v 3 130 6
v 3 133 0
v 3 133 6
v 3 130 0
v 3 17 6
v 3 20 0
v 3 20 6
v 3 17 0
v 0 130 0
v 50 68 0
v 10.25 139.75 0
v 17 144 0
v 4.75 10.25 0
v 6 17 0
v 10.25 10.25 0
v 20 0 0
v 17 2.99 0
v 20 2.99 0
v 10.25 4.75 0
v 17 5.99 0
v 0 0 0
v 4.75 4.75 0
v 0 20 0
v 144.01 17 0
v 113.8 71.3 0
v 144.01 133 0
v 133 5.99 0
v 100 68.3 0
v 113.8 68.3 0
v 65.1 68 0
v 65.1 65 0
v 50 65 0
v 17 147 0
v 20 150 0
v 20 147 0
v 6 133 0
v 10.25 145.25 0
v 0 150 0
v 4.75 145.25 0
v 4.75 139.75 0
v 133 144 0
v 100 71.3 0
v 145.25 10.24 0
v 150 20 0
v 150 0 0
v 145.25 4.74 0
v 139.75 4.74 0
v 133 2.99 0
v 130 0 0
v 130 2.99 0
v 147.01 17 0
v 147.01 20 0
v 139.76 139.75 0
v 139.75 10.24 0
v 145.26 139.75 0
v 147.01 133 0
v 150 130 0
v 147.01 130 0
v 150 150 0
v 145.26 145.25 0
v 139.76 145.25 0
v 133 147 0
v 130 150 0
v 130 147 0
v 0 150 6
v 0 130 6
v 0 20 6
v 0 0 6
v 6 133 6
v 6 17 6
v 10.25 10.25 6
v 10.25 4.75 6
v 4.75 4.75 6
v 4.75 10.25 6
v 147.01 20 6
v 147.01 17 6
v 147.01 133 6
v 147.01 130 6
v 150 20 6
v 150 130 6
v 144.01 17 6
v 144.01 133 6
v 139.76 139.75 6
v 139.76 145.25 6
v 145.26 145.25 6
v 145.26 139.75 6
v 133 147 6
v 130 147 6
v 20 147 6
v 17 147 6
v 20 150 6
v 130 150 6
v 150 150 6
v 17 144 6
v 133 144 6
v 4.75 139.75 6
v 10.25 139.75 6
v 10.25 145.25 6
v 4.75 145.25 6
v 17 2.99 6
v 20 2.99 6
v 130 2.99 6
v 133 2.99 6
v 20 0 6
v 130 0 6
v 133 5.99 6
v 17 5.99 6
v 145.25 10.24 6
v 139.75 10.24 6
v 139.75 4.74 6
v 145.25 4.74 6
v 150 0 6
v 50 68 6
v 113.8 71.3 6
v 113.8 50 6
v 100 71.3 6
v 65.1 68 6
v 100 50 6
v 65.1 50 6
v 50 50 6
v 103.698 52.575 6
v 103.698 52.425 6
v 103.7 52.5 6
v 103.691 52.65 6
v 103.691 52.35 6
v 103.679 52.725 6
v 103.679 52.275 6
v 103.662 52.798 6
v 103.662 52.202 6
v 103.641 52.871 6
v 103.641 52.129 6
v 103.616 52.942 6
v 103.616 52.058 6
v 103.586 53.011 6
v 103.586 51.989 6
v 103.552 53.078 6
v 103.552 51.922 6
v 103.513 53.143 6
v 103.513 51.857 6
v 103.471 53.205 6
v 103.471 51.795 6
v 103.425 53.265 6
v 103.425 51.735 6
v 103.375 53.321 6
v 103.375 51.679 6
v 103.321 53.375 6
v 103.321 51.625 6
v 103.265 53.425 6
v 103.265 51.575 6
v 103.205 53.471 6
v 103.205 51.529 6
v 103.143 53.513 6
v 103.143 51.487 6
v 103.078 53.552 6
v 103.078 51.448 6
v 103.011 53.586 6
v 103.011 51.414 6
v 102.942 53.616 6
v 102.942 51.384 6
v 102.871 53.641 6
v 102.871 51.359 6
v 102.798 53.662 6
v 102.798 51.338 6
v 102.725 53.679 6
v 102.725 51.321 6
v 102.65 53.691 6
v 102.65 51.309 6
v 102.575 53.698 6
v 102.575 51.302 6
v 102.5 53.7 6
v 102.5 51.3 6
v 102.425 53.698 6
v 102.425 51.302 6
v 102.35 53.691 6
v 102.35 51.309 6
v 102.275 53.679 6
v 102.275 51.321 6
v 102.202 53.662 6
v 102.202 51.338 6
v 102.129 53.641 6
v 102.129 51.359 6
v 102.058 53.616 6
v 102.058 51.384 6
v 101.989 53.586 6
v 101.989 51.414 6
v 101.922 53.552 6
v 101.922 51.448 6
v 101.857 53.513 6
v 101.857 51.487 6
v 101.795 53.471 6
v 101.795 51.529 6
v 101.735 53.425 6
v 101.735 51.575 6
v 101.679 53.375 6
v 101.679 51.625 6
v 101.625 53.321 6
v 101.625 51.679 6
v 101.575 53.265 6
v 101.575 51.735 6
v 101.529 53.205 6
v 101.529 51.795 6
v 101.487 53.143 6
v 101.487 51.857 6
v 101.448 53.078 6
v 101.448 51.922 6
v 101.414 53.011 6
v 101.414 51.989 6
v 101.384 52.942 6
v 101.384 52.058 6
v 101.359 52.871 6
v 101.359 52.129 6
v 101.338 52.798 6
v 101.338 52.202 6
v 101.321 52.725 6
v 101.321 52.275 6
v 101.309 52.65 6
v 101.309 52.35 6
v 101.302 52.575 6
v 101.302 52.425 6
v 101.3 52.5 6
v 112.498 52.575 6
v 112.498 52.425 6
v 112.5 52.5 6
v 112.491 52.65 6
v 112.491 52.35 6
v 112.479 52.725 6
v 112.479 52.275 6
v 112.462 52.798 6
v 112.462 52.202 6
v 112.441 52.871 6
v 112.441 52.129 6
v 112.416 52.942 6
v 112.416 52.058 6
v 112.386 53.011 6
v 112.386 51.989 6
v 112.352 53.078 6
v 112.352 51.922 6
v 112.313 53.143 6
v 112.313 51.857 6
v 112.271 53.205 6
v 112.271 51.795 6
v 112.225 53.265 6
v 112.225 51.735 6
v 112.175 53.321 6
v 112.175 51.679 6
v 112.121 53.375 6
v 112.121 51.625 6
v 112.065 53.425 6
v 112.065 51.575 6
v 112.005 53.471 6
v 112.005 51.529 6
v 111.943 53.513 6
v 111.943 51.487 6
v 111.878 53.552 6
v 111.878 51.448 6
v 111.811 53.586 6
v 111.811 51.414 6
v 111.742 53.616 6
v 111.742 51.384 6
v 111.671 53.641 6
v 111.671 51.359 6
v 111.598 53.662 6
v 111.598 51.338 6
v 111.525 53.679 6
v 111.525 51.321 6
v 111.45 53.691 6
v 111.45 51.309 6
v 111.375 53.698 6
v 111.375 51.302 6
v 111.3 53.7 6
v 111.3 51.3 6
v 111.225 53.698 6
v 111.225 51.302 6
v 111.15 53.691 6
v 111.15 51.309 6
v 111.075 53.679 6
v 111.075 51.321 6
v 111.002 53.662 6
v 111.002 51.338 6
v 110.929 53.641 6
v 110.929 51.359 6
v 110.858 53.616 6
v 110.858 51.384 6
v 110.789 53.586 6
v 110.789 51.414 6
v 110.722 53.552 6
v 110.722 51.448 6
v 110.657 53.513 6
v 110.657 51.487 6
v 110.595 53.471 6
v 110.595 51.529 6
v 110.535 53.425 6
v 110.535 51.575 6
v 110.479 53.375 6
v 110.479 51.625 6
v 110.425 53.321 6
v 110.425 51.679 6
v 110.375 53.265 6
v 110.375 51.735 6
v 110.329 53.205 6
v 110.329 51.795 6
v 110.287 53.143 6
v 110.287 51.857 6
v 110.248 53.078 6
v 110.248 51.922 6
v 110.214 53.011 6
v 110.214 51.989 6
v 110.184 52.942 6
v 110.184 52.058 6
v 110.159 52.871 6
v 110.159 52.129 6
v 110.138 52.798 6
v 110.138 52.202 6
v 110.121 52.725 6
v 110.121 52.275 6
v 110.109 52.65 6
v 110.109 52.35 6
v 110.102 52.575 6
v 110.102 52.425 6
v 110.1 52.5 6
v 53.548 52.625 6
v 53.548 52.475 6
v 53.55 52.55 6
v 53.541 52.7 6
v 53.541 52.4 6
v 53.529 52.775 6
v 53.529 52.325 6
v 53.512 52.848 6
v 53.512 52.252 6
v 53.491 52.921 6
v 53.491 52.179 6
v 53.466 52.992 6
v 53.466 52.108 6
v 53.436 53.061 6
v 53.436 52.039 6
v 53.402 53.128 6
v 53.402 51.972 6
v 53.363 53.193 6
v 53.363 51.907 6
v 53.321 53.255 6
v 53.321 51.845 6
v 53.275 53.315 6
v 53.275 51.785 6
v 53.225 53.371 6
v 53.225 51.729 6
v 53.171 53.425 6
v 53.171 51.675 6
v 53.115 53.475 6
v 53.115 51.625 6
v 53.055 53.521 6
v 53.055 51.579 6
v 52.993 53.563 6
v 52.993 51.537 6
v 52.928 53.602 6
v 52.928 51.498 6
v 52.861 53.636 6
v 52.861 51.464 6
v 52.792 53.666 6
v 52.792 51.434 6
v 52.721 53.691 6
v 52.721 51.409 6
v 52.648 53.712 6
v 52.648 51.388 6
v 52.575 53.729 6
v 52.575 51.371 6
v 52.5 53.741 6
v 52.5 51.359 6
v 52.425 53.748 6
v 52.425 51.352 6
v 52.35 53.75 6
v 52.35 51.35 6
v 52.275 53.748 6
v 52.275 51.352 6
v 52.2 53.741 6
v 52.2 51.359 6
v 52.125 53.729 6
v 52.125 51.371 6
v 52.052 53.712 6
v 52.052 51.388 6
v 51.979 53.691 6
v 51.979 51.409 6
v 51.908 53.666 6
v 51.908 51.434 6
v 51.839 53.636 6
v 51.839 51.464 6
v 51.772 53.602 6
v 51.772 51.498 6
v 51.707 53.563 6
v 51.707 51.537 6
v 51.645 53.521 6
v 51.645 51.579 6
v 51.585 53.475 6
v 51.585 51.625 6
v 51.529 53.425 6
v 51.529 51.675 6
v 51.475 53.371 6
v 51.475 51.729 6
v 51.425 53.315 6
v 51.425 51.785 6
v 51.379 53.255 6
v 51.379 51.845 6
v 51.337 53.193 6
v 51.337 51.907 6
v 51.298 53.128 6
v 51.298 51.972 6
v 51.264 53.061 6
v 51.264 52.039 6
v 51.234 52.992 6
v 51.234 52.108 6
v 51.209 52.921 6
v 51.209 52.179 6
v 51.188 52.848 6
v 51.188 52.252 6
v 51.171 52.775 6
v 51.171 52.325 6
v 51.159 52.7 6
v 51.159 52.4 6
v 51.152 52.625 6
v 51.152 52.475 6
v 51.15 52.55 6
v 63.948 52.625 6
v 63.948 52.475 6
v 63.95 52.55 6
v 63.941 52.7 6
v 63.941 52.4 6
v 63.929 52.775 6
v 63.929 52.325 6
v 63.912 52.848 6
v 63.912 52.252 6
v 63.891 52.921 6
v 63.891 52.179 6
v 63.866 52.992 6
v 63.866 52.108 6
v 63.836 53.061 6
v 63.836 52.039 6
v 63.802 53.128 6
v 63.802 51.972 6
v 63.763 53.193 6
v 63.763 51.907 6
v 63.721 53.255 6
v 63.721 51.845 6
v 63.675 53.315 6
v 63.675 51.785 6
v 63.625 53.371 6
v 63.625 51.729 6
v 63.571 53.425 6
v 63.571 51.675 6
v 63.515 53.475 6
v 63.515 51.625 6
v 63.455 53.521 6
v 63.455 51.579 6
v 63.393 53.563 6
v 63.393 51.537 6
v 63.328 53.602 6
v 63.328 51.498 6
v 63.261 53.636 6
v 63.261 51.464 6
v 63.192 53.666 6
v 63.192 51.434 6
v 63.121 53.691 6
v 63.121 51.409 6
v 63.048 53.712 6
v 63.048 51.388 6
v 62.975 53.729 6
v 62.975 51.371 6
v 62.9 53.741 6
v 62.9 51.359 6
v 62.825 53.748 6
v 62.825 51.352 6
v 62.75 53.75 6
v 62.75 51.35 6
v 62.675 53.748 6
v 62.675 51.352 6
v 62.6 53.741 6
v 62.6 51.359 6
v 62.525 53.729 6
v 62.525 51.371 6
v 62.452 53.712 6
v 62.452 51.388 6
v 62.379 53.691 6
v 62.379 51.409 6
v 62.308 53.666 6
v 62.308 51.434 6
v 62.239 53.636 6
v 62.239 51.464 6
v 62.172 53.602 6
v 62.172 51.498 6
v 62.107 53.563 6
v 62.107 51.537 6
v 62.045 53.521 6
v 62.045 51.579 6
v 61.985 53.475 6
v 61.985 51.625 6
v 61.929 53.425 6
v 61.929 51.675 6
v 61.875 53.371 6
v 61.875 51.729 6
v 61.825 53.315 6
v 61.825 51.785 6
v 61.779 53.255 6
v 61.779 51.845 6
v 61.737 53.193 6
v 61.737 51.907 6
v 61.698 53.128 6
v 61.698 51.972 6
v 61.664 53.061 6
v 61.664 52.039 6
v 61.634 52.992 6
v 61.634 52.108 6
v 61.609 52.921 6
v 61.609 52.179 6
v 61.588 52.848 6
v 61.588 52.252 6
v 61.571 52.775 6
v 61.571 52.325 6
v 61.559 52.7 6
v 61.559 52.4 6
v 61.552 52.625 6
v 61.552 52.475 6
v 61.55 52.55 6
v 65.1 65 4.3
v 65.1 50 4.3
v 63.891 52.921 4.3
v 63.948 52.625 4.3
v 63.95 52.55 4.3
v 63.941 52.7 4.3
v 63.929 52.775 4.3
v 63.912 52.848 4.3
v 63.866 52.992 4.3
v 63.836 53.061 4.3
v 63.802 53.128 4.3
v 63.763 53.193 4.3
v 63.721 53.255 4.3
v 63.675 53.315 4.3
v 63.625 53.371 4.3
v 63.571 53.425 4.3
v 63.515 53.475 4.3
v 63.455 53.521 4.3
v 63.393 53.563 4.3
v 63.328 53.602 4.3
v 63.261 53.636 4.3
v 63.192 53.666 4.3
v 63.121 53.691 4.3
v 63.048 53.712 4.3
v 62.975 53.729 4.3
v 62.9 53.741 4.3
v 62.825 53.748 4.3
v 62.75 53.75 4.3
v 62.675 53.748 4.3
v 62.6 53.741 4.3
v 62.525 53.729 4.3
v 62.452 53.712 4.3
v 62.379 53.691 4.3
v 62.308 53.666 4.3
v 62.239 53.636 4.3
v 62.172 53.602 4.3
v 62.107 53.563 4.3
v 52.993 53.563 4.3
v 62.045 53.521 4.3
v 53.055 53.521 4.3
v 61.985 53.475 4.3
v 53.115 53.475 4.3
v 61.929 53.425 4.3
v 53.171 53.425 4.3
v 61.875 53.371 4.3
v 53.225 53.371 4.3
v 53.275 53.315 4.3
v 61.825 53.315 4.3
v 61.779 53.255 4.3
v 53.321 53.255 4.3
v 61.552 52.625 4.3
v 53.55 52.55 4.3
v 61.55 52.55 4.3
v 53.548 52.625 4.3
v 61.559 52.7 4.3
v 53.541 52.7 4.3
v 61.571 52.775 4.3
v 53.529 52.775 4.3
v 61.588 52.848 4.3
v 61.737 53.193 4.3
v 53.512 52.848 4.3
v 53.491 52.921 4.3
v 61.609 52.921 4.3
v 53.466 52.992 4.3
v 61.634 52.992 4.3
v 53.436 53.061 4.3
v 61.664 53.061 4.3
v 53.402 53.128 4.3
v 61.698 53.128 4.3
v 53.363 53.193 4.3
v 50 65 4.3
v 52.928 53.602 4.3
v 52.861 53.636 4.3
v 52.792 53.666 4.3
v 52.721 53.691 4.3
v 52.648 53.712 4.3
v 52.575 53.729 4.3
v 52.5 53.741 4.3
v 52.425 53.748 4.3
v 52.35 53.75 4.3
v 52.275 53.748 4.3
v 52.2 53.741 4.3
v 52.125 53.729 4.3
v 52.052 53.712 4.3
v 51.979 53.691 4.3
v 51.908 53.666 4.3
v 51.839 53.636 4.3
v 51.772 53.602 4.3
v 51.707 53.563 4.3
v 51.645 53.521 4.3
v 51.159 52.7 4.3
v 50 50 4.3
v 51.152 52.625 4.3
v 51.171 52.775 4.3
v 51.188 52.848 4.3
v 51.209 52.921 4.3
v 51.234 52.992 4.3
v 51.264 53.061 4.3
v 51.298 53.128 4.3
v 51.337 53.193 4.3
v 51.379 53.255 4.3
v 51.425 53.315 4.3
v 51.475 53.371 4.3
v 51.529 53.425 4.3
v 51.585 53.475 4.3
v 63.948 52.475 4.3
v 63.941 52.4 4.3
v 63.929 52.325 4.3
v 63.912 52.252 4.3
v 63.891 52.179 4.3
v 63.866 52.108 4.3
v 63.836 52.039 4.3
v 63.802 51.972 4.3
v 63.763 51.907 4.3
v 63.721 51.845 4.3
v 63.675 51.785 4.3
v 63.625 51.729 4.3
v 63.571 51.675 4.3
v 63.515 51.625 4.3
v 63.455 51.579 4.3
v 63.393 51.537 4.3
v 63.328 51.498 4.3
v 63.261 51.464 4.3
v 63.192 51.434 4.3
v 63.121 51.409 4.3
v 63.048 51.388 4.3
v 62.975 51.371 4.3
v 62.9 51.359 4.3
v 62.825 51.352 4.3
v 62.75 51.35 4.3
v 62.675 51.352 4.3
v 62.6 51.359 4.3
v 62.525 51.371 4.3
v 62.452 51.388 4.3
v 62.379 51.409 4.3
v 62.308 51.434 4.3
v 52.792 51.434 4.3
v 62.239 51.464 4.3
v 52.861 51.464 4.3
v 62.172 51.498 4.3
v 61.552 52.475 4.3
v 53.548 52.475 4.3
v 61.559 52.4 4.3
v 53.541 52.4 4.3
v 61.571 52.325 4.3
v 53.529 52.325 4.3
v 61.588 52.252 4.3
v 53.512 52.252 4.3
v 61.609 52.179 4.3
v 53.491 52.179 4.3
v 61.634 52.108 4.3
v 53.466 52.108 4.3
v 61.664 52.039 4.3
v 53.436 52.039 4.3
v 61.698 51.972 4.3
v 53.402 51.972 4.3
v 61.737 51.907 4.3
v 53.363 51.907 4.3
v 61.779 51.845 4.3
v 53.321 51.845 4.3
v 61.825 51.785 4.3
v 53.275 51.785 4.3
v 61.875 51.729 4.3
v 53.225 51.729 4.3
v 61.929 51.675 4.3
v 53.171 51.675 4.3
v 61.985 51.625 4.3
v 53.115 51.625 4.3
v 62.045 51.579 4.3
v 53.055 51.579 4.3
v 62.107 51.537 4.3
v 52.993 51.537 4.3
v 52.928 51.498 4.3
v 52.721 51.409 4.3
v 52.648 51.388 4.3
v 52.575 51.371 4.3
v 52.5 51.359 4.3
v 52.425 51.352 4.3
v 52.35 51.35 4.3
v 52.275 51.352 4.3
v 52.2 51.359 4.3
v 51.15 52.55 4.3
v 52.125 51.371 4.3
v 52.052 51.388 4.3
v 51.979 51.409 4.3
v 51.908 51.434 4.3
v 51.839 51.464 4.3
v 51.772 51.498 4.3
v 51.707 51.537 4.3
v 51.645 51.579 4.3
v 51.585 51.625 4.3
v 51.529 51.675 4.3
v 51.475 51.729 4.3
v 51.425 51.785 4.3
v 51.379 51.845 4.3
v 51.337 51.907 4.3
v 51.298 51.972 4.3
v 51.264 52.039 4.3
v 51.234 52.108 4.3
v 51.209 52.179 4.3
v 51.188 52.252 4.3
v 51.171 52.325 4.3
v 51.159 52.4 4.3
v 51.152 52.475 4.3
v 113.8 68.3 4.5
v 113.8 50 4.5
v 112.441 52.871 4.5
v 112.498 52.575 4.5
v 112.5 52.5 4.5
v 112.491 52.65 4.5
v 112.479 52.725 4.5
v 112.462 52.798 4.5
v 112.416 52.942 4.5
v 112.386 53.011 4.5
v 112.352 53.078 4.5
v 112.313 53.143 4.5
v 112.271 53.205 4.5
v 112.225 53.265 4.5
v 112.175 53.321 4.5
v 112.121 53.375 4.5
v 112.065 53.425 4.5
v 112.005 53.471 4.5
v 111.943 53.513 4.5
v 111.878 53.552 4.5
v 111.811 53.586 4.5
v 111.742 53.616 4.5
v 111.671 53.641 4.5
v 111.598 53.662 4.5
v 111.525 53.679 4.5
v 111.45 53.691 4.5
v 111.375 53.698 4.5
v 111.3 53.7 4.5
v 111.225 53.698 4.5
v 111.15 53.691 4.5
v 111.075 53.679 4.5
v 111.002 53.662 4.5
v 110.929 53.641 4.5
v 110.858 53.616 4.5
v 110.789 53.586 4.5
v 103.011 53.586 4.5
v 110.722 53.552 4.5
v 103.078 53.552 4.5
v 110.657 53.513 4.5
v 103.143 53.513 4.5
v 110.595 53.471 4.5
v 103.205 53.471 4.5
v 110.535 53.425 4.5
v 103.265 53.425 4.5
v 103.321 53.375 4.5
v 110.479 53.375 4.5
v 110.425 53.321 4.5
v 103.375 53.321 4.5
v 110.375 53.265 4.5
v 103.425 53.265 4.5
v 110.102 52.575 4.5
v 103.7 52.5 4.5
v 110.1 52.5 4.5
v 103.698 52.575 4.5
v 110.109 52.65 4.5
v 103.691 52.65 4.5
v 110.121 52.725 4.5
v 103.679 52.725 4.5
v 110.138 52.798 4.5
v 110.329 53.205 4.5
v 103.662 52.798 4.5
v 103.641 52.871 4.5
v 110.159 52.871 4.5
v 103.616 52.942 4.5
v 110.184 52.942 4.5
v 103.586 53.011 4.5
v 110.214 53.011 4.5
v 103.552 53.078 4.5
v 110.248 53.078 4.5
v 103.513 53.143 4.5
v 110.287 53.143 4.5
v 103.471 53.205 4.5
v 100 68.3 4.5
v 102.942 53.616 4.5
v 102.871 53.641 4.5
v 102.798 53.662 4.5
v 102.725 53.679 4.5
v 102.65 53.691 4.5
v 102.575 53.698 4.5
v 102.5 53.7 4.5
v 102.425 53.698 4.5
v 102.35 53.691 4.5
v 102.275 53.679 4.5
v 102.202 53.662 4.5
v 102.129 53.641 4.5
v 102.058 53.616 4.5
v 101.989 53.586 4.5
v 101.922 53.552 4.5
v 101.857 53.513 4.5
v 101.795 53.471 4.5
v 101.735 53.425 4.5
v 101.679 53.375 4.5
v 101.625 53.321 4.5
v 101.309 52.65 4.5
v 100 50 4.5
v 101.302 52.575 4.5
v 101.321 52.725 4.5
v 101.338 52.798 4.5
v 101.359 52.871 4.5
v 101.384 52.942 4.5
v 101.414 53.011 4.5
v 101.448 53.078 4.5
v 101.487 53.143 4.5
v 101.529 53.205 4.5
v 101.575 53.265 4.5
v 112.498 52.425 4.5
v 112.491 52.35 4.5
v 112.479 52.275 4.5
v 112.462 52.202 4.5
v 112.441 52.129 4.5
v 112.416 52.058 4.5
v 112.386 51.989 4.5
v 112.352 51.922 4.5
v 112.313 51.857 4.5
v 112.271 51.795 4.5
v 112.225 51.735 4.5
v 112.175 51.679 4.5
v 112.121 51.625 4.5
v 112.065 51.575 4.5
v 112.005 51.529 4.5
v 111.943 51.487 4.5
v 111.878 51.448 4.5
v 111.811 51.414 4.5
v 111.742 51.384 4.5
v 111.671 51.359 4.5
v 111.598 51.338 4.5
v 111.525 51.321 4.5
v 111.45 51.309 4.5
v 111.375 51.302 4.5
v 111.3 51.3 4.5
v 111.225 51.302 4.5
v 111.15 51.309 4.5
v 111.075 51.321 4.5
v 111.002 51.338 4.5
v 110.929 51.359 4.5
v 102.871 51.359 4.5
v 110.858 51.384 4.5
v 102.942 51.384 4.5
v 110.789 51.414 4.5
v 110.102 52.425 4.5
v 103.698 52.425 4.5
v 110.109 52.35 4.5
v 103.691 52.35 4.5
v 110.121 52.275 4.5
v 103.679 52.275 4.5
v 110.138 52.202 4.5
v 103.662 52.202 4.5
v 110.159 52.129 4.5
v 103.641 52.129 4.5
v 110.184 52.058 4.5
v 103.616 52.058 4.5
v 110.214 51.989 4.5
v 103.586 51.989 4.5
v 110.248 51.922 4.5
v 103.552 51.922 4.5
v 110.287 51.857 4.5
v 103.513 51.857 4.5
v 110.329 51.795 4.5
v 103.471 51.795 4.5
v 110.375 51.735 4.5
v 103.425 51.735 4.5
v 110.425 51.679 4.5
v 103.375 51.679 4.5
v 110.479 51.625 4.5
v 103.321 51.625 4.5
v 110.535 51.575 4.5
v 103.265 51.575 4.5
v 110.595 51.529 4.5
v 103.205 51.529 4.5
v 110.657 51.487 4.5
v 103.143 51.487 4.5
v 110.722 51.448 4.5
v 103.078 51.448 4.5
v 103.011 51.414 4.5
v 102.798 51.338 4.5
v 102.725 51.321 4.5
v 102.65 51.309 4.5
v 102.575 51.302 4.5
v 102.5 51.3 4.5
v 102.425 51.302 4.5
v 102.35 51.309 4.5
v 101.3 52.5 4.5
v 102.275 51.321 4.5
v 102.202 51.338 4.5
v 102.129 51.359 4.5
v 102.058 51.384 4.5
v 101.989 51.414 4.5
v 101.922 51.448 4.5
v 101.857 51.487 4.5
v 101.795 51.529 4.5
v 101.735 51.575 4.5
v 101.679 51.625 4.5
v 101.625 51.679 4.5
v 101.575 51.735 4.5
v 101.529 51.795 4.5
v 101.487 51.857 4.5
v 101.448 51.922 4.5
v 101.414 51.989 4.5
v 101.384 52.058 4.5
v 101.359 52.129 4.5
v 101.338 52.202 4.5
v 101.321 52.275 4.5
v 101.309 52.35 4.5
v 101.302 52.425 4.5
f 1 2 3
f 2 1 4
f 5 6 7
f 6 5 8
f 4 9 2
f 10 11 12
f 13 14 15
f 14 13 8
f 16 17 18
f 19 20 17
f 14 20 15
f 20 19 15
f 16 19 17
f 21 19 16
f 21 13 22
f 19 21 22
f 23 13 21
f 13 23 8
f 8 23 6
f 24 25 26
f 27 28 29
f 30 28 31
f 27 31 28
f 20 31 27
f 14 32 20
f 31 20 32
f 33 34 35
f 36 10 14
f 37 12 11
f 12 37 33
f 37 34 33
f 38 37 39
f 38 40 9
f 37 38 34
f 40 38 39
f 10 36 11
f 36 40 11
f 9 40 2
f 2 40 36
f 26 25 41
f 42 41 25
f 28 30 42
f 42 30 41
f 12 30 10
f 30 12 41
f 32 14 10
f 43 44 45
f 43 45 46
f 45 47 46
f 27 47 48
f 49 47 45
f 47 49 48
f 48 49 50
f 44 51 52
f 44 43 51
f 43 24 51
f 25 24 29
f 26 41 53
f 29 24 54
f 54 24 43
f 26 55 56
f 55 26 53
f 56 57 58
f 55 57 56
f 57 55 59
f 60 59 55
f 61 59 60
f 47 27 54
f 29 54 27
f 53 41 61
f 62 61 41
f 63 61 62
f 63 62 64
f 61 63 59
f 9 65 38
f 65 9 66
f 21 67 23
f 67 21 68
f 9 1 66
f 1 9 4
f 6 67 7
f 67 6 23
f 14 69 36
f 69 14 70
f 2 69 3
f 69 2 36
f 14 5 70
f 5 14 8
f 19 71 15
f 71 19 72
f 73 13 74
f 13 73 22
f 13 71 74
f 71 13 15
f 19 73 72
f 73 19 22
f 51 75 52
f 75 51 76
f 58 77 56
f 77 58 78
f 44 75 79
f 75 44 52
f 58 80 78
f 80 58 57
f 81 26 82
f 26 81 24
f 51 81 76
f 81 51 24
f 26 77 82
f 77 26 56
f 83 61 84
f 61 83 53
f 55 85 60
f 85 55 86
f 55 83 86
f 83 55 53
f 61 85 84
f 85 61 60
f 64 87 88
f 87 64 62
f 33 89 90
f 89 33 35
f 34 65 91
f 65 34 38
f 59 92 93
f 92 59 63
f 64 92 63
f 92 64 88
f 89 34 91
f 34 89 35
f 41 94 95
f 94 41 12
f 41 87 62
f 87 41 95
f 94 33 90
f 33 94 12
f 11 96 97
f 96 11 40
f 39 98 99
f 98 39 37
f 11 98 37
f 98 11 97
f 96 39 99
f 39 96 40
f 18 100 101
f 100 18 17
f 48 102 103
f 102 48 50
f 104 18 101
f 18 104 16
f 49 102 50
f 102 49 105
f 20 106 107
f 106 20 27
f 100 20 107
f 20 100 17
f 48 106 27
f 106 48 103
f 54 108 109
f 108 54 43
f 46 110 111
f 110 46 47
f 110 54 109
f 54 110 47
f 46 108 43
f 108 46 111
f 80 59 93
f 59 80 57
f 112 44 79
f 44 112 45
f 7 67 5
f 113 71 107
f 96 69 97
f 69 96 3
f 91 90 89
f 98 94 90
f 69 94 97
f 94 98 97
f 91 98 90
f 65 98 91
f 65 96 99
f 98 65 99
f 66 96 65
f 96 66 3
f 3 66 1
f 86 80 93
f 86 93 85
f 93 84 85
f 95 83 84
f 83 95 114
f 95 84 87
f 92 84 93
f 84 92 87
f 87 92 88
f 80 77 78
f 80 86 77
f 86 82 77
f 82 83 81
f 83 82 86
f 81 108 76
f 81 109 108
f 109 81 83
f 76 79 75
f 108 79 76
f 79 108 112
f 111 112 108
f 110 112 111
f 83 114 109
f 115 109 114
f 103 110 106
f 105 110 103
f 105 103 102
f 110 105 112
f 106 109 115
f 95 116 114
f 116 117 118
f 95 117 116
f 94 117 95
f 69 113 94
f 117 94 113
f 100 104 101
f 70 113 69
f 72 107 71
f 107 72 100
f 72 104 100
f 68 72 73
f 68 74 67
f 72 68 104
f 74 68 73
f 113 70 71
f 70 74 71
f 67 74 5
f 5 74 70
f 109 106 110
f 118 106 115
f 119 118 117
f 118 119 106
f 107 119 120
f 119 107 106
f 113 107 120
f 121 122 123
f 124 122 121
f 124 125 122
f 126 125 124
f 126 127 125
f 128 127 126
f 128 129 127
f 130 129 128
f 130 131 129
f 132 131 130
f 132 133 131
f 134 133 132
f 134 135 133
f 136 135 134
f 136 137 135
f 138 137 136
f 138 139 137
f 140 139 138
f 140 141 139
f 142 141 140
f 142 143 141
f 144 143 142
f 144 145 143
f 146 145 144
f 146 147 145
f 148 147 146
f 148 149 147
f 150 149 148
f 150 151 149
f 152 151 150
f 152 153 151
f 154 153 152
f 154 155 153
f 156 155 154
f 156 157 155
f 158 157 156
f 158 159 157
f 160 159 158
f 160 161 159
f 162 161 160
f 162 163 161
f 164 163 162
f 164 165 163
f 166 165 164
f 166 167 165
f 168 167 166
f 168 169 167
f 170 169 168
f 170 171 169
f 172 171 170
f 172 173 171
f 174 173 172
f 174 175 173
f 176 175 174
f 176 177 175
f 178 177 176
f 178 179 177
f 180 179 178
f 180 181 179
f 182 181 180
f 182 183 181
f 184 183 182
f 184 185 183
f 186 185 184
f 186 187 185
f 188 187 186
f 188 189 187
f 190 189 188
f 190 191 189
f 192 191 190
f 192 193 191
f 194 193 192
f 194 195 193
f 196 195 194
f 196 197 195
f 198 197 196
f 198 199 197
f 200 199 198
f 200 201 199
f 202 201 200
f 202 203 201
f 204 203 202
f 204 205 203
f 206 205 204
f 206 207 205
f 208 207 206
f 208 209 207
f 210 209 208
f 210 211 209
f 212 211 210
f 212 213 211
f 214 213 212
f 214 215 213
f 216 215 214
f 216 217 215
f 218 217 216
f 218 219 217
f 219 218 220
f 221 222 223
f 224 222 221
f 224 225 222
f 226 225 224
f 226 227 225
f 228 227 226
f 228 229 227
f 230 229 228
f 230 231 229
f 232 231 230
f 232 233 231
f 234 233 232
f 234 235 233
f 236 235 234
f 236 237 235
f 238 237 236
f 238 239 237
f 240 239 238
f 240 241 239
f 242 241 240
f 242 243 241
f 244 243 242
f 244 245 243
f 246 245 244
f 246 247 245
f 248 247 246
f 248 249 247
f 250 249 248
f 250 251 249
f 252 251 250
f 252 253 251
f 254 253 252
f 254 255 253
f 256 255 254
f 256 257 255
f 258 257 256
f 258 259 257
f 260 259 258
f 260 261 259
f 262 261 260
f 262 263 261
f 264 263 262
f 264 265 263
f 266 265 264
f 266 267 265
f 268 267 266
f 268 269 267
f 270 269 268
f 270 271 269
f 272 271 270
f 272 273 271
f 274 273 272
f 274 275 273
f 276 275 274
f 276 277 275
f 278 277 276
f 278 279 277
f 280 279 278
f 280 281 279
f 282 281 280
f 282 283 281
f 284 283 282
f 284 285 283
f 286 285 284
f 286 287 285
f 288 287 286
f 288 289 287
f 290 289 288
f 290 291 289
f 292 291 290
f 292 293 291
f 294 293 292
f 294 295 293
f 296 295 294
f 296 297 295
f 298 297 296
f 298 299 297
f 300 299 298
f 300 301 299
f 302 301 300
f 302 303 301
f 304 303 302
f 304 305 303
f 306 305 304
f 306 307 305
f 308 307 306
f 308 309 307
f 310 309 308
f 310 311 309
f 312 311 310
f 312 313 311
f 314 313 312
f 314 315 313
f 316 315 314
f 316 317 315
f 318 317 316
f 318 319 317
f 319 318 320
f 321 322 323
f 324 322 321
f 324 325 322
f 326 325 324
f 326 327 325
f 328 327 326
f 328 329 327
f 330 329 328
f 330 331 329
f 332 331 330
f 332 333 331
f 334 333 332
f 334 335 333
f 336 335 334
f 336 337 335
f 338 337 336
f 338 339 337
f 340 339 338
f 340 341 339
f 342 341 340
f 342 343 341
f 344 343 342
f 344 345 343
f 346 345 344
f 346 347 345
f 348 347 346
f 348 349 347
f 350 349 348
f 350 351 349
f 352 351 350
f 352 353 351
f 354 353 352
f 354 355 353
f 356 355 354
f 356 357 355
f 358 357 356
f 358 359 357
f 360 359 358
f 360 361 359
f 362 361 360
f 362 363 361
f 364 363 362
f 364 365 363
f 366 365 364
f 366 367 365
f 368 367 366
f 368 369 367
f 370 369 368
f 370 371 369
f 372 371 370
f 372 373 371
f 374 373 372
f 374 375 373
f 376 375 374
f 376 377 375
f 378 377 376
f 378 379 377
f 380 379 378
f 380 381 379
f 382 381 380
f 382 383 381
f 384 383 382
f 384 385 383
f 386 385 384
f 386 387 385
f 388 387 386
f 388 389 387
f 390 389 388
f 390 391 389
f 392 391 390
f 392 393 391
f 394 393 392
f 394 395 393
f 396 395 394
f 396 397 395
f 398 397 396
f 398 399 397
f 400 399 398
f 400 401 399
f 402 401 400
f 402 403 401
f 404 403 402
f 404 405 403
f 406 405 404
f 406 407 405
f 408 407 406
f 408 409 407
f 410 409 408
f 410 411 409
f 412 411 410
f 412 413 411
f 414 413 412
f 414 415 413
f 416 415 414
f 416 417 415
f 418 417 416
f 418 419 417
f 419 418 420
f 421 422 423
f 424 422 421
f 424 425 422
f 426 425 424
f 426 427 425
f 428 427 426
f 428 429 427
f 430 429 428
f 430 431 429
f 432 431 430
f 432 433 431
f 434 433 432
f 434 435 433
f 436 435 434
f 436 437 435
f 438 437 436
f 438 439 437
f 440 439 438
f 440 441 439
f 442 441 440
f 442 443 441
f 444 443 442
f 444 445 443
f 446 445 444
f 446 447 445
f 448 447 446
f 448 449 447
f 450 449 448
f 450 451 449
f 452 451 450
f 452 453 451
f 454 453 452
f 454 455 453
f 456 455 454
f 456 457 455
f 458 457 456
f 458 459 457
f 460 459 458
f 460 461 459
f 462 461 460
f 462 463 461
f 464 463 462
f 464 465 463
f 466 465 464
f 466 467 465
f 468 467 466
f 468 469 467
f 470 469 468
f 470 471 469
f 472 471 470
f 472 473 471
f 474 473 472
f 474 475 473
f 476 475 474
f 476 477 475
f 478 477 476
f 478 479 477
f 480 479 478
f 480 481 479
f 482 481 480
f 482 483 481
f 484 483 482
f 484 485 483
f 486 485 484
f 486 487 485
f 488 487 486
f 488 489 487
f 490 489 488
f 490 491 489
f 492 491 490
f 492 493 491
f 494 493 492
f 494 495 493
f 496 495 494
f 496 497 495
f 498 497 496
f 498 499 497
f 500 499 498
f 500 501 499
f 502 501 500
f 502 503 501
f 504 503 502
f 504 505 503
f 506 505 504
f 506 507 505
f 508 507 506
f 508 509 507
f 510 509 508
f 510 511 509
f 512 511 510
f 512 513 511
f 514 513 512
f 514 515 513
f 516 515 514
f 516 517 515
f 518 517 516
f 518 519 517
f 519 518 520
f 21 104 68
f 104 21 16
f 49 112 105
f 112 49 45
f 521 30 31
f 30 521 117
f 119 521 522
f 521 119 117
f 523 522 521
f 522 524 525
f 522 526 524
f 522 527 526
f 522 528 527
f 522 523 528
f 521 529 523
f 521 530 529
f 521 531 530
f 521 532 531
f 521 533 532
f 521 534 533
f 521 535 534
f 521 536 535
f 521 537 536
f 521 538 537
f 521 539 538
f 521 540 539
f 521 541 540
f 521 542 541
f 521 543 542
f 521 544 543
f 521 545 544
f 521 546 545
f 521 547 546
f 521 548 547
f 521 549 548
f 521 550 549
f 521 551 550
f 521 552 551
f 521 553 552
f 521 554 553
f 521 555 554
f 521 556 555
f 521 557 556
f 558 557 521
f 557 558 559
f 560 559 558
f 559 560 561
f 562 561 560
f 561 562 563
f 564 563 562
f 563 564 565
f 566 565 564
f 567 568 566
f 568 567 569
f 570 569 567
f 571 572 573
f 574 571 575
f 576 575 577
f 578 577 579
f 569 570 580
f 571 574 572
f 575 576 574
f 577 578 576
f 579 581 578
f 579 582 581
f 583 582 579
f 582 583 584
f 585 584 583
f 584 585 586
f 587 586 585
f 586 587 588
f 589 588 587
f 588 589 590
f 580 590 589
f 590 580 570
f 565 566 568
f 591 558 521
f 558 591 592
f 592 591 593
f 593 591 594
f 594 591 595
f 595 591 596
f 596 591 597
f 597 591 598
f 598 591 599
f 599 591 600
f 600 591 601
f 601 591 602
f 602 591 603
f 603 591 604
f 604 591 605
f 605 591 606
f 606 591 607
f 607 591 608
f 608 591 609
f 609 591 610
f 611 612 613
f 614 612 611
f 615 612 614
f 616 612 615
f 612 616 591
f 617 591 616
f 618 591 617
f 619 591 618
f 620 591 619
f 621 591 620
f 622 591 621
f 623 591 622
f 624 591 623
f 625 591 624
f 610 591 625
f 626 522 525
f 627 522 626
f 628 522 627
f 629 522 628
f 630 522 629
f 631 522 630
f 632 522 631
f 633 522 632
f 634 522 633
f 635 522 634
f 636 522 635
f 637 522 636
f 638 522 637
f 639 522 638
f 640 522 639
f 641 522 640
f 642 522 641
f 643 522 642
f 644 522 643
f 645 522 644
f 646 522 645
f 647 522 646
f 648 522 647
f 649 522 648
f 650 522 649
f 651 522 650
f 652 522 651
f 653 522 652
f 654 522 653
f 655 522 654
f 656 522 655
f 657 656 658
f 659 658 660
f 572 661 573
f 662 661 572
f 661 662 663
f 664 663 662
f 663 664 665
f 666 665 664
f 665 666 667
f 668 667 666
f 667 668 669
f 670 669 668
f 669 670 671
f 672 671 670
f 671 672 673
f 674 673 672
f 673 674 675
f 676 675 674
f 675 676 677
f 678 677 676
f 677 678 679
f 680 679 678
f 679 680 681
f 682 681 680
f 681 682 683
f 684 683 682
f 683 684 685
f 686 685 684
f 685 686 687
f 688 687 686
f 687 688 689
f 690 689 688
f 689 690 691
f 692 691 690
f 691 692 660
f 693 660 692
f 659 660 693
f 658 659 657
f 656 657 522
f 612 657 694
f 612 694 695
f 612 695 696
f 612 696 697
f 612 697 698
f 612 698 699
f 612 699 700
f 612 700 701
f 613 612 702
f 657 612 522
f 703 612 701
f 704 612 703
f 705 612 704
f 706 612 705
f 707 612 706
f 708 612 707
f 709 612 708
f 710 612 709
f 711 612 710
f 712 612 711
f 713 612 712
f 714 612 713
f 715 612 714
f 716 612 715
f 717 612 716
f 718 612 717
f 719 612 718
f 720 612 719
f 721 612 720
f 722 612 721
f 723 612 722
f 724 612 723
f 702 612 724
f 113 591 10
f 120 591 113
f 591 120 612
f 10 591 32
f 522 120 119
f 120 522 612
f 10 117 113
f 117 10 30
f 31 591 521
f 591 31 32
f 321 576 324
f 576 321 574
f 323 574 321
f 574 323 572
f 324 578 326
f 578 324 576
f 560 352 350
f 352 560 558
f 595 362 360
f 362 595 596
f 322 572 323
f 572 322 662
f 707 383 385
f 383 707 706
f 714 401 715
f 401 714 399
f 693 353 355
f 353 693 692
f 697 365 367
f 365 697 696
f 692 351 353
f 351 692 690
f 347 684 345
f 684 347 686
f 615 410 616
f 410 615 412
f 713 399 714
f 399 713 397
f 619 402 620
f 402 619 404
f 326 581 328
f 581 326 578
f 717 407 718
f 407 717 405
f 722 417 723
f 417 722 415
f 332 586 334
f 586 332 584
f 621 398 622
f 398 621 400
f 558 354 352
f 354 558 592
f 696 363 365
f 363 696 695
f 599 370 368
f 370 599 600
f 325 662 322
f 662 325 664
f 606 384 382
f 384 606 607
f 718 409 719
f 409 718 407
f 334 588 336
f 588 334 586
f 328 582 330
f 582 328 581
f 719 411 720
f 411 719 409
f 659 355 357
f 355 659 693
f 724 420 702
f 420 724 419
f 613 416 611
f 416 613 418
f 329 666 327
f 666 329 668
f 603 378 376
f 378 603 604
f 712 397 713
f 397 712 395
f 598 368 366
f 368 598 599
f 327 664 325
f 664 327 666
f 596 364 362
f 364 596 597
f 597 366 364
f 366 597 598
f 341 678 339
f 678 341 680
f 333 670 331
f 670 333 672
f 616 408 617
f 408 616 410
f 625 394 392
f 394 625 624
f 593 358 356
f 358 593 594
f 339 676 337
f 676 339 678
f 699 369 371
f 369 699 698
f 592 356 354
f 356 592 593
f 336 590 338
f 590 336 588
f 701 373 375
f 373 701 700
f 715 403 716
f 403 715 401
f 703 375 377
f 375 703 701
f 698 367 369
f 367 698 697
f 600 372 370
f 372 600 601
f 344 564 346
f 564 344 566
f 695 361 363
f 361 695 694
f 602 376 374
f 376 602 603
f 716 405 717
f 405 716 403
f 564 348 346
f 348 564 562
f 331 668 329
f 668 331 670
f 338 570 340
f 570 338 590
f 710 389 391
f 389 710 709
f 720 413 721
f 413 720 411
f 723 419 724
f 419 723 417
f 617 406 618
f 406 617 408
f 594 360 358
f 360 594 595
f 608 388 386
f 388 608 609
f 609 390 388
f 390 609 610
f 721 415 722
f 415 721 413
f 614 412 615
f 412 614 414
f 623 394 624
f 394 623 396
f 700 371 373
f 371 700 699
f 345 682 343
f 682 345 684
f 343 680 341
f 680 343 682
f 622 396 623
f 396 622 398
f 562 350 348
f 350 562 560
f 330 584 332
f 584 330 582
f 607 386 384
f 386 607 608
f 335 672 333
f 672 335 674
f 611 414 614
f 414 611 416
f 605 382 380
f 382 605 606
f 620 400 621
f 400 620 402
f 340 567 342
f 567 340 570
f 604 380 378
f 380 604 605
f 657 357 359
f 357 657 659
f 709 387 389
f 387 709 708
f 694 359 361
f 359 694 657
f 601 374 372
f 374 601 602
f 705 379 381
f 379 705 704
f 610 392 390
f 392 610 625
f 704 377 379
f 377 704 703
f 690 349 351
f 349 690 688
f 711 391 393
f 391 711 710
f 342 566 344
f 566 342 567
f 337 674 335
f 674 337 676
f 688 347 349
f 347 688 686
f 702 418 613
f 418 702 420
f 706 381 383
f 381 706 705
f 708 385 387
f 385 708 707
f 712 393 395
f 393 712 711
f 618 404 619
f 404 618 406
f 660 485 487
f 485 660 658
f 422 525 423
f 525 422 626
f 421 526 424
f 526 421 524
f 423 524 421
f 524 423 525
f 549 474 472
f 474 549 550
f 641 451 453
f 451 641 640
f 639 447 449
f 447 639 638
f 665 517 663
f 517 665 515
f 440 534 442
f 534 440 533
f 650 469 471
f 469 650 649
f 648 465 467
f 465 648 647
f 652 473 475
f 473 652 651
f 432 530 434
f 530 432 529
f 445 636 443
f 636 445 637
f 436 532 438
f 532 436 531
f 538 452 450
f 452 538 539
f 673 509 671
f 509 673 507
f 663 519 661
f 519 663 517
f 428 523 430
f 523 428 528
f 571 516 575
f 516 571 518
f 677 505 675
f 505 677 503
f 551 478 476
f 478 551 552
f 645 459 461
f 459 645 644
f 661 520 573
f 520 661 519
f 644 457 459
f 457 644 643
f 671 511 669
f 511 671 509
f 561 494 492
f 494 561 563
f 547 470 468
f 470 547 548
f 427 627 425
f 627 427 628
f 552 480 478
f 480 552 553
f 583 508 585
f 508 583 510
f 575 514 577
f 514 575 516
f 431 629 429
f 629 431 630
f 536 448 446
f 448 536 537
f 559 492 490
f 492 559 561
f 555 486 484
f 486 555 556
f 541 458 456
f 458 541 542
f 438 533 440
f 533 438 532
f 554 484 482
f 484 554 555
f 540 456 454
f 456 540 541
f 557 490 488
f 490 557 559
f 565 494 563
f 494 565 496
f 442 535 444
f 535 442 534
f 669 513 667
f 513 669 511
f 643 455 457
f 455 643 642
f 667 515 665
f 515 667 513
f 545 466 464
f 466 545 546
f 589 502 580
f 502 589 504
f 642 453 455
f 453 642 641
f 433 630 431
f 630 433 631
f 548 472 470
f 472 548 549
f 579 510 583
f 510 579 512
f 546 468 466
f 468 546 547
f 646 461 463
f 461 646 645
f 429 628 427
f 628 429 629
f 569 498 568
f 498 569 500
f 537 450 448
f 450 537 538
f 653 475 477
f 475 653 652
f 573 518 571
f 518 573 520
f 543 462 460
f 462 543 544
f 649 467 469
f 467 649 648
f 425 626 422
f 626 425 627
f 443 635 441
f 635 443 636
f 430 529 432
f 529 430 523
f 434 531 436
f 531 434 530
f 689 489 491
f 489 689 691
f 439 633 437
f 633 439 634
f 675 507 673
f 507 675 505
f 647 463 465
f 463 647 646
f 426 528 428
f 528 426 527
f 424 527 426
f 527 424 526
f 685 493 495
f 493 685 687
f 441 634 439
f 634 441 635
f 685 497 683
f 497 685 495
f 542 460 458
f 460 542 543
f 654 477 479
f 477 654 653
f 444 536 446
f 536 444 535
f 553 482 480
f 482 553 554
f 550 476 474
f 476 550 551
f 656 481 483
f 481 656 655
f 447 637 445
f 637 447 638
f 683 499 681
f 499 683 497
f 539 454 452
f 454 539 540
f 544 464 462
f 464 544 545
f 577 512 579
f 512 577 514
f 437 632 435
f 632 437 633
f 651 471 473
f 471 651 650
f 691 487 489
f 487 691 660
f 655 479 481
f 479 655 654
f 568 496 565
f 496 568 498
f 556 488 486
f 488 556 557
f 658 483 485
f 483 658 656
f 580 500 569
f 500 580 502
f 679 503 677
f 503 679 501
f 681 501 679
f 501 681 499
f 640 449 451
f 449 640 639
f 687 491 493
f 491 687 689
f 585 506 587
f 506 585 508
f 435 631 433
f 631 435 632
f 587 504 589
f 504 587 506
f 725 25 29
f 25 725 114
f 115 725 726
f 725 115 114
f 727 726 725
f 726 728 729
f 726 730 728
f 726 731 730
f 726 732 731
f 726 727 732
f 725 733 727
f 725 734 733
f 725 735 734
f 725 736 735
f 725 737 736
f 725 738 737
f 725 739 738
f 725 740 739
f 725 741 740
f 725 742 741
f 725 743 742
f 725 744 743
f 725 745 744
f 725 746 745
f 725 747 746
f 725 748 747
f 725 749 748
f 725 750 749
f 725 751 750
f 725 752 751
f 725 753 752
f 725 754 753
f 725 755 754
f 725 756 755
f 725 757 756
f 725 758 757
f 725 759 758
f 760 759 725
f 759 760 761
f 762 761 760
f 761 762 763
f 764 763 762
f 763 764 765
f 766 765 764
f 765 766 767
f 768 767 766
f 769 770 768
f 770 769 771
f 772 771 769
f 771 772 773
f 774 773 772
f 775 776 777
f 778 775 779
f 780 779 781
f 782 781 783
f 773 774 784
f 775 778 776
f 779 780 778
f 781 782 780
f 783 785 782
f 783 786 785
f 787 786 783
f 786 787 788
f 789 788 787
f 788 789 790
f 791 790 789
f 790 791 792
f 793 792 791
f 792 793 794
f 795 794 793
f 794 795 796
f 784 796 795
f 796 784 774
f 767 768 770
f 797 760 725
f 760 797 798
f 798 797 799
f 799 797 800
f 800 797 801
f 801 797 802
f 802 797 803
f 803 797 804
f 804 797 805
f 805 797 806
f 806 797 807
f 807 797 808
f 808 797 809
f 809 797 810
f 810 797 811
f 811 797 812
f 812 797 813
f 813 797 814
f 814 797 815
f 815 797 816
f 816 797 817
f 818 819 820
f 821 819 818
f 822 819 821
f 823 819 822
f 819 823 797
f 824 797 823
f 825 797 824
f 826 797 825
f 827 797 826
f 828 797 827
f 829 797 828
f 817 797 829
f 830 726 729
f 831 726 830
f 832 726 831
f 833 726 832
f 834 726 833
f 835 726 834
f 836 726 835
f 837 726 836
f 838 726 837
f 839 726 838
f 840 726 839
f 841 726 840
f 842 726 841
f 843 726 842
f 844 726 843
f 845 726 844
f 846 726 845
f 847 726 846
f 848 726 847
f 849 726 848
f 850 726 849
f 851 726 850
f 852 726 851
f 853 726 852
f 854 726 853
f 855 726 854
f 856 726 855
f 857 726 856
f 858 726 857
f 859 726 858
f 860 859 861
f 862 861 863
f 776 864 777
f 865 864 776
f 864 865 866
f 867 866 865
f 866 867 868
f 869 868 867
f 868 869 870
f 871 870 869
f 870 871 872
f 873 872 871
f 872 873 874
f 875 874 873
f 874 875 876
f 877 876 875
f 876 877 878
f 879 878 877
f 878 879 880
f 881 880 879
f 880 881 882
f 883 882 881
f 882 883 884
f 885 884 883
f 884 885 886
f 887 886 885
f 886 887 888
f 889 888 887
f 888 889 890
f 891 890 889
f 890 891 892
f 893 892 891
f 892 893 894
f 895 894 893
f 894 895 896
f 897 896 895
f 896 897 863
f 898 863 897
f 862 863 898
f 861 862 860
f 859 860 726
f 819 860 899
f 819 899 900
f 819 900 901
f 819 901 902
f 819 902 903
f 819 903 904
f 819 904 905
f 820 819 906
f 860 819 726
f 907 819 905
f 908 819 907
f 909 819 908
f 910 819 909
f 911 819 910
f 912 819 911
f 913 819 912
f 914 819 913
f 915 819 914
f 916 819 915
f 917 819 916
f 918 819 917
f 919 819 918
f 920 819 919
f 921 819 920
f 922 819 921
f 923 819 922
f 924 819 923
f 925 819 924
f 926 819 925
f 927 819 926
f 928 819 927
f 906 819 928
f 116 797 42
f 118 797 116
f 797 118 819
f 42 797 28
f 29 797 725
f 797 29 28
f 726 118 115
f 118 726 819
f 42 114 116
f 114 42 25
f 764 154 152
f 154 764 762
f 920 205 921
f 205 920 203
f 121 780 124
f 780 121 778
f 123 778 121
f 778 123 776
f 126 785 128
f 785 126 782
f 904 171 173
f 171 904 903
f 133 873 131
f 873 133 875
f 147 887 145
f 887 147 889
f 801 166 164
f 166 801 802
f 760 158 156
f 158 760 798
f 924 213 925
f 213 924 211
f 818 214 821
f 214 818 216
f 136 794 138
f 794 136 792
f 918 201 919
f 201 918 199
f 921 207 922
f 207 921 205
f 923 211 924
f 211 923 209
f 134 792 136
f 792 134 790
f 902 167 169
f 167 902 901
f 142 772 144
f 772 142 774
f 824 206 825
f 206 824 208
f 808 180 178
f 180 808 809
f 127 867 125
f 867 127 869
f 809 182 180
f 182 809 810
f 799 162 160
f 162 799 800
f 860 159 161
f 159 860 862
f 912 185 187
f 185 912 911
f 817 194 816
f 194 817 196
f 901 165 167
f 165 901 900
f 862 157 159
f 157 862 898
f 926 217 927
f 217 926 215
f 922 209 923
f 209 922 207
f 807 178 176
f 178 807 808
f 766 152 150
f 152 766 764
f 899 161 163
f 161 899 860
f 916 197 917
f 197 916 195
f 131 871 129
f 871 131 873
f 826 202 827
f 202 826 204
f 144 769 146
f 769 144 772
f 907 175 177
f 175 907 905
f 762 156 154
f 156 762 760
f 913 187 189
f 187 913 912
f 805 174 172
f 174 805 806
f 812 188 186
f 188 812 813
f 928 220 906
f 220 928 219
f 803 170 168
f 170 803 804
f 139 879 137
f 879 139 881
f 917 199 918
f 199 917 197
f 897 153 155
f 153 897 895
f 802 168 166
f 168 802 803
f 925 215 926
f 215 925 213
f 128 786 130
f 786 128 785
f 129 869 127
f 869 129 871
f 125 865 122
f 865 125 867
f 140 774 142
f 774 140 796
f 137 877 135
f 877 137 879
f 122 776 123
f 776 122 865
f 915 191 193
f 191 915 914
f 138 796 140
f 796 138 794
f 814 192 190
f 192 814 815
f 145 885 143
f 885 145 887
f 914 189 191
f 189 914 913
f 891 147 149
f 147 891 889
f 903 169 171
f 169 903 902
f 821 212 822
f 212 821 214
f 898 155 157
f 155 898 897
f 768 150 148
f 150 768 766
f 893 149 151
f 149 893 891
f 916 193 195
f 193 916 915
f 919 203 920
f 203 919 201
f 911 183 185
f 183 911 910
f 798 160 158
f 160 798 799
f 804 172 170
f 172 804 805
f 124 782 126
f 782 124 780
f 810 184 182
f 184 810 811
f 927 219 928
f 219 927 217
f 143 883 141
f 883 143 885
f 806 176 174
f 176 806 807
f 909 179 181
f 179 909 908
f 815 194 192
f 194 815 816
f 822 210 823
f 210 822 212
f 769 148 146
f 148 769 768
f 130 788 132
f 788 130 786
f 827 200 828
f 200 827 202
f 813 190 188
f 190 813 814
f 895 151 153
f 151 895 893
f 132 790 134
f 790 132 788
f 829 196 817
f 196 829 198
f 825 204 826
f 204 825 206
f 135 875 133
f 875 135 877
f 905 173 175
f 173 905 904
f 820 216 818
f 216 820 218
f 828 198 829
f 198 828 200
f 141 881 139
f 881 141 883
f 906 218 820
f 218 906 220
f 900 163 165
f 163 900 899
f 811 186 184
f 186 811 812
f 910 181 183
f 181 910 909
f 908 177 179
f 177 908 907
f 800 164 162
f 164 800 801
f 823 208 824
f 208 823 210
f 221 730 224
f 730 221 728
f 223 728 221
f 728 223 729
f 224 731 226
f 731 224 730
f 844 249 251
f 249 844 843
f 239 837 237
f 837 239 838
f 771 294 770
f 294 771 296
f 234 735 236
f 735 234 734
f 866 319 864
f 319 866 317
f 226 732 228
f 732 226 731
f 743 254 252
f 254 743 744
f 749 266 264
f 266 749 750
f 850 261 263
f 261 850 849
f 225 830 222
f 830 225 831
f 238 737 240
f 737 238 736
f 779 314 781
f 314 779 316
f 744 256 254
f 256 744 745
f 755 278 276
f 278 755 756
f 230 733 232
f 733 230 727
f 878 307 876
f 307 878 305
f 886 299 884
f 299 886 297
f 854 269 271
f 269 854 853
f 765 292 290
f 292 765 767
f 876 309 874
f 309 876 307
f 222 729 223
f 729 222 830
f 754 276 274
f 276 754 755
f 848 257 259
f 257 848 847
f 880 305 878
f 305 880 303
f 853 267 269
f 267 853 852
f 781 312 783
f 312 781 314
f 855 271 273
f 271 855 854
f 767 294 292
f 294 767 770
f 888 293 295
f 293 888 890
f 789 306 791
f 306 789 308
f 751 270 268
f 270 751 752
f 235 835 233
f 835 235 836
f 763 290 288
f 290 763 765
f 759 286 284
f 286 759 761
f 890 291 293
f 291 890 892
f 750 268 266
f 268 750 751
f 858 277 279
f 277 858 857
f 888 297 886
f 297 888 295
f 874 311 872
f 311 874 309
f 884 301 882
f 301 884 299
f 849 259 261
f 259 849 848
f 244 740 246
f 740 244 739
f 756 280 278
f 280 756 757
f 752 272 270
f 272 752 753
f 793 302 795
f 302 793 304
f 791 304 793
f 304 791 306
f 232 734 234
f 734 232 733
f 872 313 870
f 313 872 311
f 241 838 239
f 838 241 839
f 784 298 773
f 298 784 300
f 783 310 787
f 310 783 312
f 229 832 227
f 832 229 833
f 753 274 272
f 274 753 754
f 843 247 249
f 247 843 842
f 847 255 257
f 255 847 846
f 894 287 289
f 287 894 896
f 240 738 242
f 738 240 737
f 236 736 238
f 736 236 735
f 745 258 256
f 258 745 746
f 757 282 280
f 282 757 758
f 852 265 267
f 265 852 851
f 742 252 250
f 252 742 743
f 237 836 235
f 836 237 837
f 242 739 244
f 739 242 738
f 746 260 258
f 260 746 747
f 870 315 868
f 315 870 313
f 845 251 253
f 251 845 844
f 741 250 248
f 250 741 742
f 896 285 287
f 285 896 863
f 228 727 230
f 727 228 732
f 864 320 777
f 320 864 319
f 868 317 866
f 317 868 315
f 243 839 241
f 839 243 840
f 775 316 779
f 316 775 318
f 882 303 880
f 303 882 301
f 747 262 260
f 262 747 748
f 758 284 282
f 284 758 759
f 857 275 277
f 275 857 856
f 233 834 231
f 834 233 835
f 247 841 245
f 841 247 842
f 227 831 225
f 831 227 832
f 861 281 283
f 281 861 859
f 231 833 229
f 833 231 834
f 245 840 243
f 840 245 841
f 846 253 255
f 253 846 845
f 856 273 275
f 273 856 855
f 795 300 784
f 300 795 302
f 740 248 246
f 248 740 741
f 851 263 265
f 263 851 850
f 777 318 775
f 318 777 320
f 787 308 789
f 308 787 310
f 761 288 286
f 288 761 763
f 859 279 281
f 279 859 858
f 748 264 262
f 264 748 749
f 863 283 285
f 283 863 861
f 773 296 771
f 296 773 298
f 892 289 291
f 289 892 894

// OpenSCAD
translate([0,0,0]) {
difference() {
        techo();
  
    union() {
        translate([50,50,4.3]) {
            ml5811();
        }
        
        translate([100,50,4.5]) {
            bh1750();
        }
    }
}
}

*estructura();
*soporte();
rotate(a = 90, v = [0,1,0]) {
  * puerta();
}
*lama();


module estructura() {
    difference() {
        // Base y 4 columnas laterales
        union() {
            cube([150,150,5]);
        
            columna(180);
    
            translate ([130,0,0]) {
                columna(-90);
            }
        
            translate ([0,130,0]) {
                columna(90);
            }
    
            translate ([130,130,0]) {
                columna(0);
            }   
        }
        
        translate([130,20,0]) {
                cylinder(h=20,r=3.25);
        }
    }
}

module soporte() {
    translate([20,50,5]) {
        cube([2.5,50,8]);
    }
    translate([60,50,5]) {
        cube([4,50,8]);
    }
    translate([128.4,50,5]) {
        cube([2.5,50,8]);
    }
}

// Recorte techo
module recorteTecho(a) {
    rotate_about_pt(a, [0, 0, 1], [10, 10, 0]) {
    union() {
        translate ([4.75,4.75,0]) {
            cube([5.5,5.5,7]);
        }

        translate ([0,20,0]) {
            union() {
                cube([3,110,7]);
                   
                translate ([3,-3,0]) {
                    cube([3,116,7]);
                }
            }
        }
    }
    }
}


// Techo
module techo() {
    difference() {
        cube([150,150,6]);
        recorteTecho(0);
        
        translate([130.01,130,0]) {
            recorteTecho(180);
        }
        
        translate([0,130,0]) {
            recorteTecho(-90);
        }       
   
        translate([130,-0.01,0]) {
            recorteTecho(90);
        }        
    }
}

// Columna
module columna (a) {
    rotate_about_pt(a, [0, 0, 1], [10, 10, 0]) {
        difference() {
            union() {
                    translate ([0,0,4]) {
                        cube([20,20,140]);
                    }

                    translate ([10,10,144]) {
                        cube([5,5,6]);
                    }
            }
            union() {    
                cube([10,10,150]);
                
                translate ([14,0,0]) {
                    cube([3,3,150]);
                }
                
                translate ([0,14,0]) {
                    cube([3,3,150]);
                }    
            }
        }
    }
}

module puerta () {
    //Puerta
    translate ([0,20,5]) {
        difference() {
            union() {
                cube([4,110,145]);
                   
                translate ([3,-3,0]) {
                    cube([2,116,145]);
                }
            }
            translate ([0,10,12.5]) {
                cube([10,90,120]);
            }
        }
        
        for (i = [10:6:130]) {
            translate ([0,10,i]) {
                lama();
            }        
        }
    }
}

// Lama
module lama() {
CubePoints = [
  [  0,   0,  0 ],  //0
  [  5,   0,  2 ],  //1
  [  5,  90,  2 ],  //2
  [  0,  90,  0 ],  //3
  [  0,   0,  2 ],  //4
  [  5,   0,  5 ],  //5
  [  5,  90,  5 ],  //6
  [  0,  90,  2 ]]; //7
  
CubeFaces = [
  [0,1,2,3],  // bottom
  [4,5,1,0],  // front
  [7,6,5,4],  // top
  [5,6,2,1],  // right
  [6,7,3,2],  // back
  [7,4,0,3]]; // left
  
polyhedron( CubePoints, CubeFaces );
}

// ML5811
module ml5811() {
    difference() {
        union() {
            cube([15.1,15.1,1.8]);
            translate([0,15,-10.1]) {
                cube([15.1,3,12.2]);
            }
            translate([5.5,4,0]) {
                cube([3.6,4,2.2]);
            }
        }
        union() {
            translate([3.1/2+0.8,2.55]) {
                cylinder(h=2, r=1.2, $fn=100);
            }
            
            translate([12.75,2.55]) {
                cylinder(h=2, r=1.2, $fn=100);
            }
        }
    }
}

// BH1750
module bh1750() {
    difference() {
        union() {
            cube([13.8,18.3,1.5]);
            translate([0,18.3,-10.1]) {
                cube([13.8,3,12.2]);
            }
            translate([5.7,6.6,0]) {
                cube([2.4,1.4,2.2]);
            }
        }
        
        union() {
            translate([2.5,2.5]) {
                cylinder(h=2, r=1.2, $fn=100);
            }
            
            translate([11.3,2.5]) {
                cylinder(h=2, r=1.2, $fn=100);
            }
        }
    }
}


module rotate_about_pt(a, v, pt) translate(pt) rotate(a,v)
translate(-pt) children();
